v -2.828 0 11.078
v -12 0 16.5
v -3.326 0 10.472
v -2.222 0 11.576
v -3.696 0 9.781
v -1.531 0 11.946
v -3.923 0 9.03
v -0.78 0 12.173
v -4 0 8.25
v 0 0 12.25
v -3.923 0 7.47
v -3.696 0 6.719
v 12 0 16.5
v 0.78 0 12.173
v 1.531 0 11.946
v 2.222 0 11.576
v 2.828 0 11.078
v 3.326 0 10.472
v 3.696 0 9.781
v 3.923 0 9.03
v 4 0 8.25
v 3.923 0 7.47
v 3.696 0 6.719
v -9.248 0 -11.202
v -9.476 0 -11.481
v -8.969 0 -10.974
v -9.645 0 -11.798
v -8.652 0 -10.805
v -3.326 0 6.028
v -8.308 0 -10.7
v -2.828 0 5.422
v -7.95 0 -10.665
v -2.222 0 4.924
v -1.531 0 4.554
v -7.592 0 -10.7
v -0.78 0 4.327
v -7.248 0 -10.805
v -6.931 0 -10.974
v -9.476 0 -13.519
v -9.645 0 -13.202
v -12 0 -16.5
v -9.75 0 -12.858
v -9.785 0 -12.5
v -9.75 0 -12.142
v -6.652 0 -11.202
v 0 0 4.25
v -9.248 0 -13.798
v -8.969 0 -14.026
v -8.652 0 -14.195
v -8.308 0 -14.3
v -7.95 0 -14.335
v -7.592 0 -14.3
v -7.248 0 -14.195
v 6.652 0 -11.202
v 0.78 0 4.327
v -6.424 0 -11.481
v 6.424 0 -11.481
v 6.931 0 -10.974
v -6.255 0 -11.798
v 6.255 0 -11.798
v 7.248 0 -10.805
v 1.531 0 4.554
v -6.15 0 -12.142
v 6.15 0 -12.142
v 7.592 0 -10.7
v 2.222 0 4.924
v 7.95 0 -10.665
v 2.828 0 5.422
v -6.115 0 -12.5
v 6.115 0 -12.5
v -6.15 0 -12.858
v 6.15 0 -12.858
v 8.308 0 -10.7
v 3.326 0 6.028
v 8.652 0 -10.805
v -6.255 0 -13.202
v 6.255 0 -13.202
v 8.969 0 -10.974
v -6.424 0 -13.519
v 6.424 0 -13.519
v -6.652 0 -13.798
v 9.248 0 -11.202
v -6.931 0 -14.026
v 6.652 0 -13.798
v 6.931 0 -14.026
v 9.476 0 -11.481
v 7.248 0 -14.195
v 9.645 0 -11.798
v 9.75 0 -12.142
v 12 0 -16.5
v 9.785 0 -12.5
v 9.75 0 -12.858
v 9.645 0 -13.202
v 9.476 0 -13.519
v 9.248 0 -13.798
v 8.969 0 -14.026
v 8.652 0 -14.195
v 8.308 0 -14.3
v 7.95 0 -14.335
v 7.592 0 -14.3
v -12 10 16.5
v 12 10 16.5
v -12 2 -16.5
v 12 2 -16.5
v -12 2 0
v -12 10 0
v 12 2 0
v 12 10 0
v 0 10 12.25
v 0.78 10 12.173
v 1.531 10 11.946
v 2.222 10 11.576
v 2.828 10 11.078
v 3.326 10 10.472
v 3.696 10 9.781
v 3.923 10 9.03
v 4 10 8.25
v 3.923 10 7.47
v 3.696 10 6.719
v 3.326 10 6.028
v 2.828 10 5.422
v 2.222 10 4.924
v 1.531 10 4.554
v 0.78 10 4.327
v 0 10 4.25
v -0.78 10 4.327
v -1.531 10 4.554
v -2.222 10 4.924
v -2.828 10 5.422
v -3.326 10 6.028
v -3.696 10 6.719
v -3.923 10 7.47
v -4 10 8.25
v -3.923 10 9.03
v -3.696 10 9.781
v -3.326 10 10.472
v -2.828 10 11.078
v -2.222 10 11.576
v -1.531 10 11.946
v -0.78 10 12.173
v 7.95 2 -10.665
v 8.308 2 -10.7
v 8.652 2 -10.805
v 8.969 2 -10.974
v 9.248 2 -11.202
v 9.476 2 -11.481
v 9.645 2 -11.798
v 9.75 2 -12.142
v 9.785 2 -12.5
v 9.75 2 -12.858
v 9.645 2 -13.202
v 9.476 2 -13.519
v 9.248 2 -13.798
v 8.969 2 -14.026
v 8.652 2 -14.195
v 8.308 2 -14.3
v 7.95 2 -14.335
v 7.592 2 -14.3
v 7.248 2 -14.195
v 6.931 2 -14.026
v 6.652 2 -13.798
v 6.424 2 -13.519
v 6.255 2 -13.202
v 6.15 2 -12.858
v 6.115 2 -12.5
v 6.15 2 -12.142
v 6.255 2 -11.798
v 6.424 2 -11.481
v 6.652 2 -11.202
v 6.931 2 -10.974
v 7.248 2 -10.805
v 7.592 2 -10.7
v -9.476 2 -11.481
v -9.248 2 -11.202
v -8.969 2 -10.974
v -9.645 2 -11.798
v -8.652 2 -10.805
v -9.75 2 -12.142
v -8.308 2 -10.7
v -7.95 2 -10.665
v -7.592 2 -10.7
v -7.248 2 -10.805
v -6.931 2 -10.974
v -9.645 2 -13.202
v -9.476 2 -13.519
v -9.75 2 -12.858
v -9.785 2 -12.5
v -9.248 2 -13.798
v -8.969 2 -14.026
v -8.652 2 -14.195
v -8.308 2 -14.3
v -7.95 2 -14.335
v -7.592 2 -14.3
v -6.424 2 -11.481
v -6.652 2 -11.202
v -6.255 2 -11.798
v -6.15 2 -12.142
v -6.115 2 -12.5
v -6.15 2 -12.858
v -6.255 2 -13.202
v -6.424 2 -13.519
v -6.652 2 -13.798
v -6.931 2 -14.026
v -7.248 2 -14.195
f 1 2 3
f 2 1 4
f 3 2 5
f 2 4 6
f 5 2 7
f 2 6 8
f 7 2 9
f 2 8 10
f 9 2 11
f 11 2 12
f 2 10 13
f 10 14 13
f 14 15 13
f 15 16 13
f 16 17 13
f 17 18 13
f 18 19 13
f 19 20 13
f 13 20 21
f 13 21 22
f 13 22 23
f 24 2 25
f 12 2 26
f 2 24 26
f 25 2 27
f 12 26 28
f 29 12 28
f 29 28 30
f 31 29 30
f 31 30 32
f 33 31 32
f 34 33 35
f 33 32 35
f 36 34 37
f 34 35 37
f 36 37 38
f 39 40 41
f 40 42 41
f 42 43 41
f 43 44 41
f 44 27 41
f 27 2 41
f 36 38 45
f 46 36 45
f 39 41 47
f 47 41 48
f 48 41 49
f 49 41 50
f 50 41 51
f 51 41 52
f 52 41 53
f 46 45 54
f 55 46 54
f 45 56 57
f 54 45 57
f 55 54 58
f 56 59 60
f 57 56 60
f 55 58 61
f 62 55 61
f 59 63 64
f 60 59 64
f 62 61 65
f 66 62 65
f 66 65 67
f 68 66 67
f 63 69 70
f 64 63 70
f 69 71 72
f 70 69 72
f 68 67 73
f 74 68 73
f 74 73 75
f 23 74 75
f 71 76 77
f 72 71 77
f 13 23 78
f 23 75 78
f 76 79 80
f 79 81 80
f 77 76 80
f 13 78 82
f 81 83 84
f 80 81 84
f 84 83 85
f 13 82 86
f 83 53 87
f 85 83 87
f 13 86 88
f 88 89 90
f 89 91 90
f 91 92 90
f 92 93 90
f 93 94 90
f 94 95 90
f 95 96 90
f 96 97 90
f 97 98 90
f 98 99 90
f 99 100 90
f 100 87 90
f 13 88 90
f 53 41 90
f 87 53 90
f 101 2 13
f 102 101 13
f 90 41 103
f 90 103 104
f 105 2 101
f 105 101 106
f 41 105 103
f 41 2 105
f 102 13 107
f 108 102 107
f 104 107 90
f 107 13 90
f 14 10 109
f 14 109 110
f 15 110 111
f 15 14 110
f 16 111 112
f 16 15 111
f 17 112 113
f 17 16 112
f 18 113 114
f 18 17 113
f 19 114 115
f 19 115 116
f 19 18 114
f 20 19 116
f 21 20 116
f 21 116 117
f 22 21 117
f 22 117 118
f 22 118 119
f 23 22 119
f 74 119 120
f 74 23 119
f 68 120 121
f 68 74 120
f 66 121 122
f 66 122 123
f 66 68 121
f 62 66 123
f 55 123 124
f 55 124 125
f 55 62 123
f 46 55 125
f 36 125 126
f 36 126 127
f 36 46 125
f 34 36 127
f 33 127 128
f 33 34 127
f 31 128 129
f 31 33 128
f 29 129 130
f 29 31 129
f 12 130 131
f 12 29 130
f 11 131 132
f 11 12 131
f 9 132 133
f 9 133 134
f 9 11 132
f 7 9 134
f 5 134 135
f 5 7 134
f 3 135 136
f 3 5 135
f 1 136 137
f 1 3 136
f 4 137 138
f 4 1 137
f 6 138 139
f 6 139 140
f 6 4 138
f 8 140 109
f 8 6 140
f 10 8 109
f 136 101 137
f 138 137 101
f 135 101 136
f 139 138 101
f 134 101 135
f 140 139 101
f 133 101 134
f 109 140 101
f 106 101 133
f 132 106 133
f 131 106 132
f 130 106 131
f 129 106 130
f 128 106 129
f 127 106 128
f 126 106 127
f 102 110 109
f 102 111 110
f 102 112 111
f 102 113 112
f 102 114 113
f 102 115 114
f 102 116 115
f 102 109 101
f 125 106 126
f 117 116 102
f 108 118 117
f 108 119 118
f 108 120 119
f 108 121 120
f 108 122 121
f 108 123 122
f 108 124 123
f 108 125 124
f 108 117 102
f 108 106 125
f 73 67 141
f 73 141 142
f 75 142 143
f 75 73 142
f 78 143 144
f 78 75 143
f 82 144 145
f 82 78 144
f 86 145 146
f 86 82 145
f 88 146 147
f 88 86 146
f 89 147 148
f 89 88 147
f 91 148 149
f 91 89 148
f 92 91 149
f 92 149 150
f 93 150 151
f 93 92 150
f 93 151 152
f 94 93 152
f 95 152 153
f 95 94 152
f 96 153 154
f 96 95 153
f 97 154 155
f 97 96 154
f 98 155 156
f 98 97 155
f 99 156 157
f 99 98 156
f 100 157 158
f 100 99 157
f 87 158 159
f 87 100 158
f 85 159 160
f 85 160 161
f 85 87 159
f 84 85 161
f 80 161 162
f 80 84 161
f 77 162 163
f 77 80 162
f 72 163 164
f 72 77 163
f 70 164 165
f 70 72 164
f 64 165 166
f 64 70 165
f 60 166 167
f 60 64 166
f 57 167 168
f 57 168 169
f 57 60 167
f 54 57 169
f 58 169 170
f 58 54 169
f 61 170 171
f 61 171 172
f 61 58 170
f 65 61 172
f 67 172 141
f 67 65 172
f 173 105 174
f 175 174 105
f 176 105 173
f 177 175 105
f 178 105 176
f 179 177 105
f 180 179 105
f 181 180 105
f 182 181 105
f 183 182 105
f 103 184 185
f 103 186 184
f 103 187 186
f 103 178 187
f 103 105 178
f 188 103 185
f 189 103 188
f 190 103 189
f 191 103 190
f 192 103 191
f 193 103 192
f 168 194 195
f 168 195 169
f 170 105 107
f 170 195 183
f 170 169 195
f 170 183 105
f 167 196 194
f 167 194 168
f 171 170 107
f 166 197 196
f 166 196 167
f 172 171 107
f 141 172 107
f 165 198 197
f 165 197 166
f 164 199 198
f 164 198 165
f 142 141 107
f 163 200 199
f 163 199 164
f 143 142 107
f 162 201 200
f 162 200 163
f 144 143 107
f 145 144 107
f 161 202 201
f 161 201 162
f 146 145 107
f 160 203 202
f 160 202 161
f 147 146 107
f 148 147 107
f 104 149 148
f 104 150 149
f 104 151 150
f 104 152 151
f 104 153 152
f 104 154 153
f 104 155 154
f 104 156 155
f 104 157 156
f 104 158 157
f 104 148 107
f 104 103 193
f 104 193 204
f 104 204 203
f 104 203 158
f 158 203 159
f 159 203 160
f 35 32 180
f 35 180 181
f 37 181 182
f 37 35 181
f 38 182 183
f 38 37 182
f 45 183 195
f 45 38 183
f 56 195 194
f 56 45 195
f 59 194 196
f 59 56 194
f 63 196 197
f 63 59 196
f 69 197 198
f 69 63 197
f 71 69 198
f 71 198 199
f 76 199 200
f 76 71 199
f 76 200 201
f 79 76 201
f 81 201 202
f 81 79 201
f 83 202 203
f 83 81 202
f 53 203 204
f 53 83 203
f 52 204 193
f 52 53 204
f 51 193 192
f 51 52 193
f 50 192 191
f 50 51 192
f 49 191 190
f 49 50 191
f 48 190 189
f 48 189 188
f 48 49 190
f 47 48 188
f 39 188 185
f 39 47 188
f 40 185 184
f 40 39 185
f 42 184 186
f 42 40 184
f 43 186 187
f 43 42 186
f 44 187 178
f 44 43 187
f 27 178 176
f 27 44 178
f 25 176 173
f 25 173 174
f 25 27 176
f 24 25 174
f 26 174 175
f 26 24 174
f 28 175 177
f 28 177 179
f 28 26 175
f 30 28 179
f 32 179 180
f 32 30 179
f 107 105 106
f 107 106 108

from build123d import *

# Parameters (mm, degrees)
SKETCH2_W           = 24
SKETCH2_H           = 16.5
SKETCH2_R           = 4
BOSS_EXTRUDE1_DEPTH = 10
SKETCH2_3_W         = 24
SKETCH2_3_H         = 16.5
SKETCH2_3_R         = 1.835
BOSS_EXTRUDE2_DEPTH = 2


with BuildPart() as part:
    # Sketch2 → Boss-Extrude1 (new body)
    with BuildSketch(Plane(origin=(0, 0, 0), x_dir=(1, 0, 0), z_dir=(0, 1, 0))):
        with Locations((0, -8.25)):
            Rectangle(SKETCH2_W, SKETCH2_H)
        with Locations((0, -8.25)):
            Circle(SKETCH2_R, mode=Mode.SUBTRACT)
    extrude(amount=BOSS_EXTRUDE1_DEPTH)

    # Sketch2<3> → Boss-Extrude2 (add)
    with BuildSketch(Plane(origin=(0, 0, 0), x_dir=(1, 0, 0), z_dir=(0, 1, 0))):
        with Locations((0, 8.25)):
            Rectangle(SKETCH2_3_W, SKETCH2_3_H)
        with Locations((-7.95, 12.5)):
            Circle(SKETCH2_3_R, mode=Mode.SUBTRACT)
        with Locations((7.95, 12.5)):
            Circle(SKETCH2_3_R, mode=Mode.SUBTRACT)
    extrude(amount=BOSS_EXTRUDE2_DEPTH)


solid = part.part
